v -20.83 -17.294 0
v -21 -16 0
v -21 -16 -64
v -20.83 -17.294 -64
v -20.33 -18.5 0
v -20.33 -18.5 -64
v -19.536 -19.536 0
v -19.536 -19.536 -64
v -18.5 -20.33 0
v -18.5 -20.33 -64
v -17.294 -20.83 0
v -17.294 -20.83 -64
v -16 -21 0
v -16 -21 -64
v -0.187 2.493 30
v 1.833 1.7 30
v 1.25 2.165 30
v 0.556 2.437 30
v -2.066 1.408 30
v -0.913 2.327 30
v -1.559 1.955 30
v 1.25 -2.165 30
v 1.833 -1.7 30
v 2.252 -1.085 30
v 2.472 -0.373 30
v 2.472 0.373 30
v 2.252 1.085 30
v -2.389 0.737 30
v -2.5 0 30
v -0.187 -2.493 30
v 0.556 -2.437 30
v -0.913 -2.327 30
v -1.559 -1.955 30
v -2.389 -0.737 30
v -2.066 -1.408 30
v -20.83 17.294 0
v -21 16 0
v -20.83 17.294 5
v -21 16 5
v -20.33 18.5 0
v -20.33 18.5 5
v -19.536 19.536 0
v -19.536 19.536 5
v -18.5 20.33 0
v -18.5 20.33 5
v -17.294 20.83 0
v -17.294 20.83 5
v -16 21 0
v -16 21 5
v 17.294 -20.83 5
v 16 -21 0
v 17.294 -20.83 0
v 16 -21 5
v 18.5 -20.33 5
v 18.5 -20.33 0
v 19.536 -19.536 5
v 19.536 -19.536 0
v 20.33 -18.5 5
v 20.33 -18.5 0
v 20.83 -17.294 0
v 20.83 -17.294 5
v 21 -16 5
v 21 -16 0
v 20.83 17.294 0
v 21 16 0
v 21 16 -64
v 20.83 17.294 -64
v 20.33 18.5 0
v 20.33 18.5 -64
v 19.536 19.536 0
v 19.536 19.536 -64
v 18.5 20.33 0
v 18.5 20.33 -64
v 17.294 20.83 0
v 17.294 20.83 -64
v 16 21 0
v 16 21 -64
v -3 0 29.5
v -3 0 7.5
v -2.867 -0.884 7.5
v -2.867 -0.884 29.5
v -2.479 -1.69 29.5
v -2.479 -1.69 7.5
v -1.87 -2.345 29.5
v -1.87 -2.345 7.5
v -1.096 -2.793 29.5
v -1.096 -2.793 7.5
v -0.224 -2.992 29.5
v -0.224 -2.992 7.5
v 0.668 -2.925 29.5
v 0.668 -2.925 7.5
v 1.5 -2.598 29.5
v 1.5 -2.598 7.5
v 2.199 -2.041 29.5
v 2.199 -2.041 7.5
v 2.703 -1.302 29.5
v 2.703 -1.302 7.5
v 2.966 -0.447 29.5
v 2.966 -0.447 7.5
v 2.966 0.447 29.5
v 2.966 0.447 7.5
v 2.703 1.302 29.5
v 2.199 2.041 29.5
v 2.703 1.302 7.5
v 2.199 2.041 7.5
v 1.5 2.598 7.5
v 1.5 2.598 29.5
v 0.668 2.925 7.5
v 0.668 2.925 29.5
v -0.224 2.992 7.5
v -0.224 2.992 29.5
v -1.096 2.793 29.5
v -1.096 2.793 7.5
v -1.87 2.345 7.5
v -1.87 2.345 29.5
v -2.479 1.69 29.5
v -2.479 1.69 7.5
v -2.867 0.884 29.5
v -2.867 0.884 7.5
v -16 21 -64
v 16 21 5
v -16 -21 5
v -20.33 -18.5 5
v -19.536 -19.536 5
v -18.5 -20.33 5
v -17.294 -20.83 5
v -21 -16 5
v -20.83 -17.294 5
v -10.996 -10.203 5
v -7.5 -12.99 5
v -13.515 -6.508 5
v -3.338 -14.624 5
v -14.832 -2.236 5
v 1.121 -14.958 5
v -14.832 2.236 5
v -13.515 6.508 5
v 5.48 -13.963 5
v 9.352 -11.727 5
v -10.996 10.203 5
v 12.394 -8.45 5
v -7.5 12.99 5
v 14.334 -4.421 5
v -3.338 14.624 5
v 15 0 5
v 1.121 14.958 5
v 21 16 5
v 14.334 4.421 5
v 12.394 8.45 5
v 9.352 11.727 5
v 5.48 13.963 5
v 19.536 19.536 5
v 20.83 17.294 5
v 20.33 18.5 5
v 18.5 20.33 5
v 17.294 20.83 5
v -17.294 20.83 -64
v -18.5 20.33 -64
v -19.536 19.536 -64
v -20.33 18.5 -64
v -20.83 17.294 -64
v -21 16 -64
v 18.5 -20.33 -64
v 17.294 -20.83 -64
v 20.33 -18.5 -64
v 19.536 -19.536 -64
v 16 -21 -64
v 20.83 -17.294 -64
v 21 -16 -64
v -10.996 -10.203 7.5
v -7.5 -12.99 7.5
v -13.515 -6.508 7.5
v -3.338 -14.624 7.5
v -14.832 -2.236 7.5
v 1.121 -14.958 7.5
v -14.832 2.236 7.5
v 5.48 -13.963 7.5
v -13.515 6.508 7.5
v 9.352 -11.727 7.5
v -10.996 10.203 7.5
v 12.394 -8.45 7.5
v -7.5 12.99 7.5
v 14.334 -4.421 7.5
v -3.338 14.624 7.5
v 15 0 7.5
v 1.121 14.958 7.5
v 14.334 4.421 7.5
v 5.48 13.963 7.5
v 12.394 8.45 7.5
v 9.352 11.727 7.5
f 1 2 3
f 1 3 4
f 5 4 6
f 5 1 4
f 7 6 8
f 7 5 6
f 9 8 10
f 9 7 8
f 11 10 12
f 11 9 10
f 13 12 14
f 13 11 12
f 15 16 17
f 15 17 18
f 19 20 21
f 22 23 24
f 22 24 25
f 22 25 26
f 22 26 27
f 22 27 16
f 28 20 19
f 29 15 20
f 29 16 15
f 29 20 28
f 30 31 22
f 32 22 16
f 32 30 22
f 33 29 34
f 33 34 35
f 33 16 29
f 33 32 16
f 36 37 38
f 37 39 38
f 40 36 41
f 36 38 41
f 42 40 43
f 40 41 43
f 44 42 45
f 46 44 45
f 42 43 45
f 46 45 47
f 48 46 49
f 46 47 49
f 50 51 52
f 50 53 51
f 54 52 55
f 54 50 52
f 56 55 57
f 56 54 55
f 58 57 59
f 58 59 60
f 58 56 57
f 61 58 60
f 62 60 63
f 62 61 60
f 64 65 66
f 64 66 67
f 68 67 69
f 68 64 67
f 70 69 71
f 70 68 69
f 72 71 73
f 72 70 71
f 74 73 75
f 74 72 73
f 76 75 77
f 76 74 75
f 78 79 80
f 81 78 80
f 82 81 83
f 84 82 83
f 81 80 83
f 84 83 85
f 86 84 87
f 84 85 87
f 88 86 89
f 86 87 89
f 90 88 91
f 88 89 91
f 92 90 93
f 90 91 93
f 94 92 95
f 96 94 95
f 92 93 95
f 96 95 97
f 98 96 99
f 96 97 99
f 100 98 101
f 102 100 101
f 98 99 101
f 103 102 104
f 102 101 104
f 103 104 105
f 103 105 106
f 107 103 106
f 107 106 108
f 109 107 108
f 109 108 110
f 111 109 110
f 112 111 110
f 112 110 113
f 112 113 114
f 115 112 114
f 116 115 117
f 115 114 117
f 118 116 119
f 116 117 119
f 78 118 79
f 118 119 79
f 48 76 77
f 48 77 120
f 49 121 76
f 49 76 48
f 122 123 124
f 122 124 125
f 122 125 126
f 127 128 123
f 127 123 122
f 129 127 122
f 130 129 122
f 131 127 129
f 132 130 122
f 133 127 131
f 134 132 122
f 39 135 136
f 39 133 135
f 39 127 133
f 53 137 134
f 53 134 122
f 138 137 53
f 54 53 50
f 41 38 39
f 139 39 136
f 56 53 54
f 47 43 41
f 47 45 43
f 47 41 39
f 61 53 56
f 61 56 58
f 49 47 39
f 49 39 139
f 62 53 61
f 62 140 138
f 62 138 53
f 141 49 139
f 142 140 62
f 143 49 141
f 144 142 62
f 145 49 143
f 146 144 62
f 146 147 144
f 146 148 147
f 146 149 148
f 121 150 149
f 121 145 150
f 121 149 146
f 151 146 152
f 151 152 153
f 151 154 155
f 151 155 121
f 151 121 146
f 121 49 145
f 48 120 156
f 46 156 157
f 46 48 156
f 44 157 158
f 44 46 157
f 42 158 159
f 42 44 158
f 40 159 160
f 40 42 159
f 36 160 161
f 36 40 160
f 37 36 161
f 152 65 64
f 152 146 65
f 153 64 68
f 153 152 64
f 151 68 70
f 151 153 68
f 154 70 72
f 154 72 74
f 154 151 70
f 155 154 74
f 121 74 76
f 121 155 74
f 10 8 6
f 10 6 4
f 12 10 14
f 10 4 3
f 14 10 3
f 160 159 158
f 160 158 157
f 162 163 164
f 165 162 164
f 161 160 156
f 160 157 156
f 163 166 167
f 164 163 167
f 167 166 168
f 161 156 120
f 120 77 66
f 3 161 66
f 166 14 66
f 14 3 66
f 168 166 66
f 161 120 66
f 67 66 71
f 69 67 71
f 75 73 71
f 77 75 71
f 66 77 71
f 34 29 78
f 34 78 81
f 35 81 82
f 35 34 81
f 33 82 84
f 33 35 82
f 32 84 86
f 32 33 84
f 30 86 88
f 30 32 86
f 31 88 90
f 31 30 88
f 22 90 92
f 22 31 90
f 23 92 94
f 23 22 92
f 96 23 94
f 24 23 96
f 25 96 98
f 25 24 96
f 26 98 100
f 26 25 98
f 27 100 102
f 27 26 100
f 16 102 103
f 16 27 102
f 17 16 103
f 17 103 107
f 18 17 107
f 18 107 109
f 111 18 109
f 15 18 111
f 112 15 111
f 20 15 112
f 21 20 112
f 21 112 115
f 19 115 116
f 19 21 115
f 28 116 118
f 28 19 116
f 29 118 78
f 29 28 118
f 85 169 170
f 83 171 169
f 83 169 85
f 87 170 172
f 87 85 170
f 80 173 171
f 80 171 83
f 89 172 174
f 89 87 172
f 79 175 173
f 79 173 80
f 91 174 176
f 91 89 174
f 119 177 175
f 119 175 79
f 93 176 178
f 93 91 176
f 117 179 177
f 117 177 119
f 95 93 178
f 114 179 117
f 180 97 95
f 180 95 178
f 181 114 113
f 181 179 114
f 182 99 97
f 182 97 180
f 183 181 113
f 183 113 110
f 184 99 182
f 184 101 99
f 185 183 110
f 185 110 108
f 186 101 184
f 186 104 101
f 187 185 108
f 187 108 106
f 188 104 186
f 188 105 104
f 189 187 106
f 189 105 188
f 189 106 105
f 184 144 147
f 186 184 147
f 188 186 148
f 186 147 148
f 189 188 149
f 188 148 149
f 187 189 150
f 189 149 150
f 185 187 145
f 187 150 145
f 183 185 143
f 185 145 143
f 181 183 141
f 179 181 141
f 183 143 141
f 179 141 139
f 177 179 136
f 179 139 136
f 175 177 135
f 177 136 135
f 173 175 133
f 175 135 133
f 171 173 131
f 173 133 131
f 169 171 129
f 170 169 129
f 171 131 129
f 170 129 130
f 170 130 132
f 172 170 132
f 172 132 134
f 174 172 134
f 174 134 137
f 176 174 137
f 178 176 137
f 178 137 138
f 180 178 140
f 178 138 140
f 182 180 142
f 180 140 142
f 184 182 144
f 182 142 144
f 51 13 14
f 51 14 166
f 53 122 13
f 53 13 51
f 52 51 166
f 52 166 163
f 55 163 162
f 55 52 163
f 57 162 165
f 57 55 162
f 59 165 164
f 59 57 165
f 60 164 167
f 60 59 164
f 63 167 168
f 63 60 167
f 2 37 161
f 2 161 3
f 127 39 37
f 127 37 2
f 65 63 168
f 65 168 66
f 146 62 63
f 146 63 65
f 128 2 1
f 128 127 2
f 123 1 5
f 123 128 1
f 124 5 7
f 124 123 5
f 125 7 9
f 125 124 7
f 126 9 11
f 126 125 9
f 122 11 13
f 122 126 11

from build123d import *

# Parameters (mm, degrees)
SKETCH1_W           = 42
SKETCH1_H           = 42
BOSS_EXTRUDE1_DEPTH = 5
FILLET1_R           = 5
SKETCH2_R           = 15
BOSS_EXTRUDE2_DEPTH = 2.5
SKETCH3_R           = 3
BOSS_EXTRUDE3_DEPTH = 22.5
BOSS_EXTRUDE5_DEPTH = 64
CHAMFER1_SIZE       = 0.5


with BuildPart() as part:
    # Sketch1 → Boss-Extrude1 (new body)
    with BuildSketch(Plane.XY):
        Rectangle(SKETCH1_W, SKETCH1_H)
    extrude(amount=BOSS_EXTRUDE1_DEPTH)

    # Fillet1
    fillet1_edges = [part.edges().sort_by_distance(p)[0] for p in [
        (21, -21, 2.5),
        (-21, -21, 2.5),
        (-21, 21, 2.5),
        (21, 21, 2.5),
    ]]
    fillet(fillet1_edges, radius=FILLET1_R)

    # Sketch2 → Boss-Extrude2 (add)
    with BuildSketch(Plane.XY.offset(5)):
        Circle(SKETCH2_R)
    extrude(amount=BOSS_EXTRUDE2_DEPTH)

    # Sketch3 → Boss-Extrude3 (add)
    with BuildSketch(Plane.XY.offset(7.5)):
        with Locations(Location((0, 0, 0), (0, 0, 180))):
            Circle(SKETCH3_R)
    extrude(amount=BOSS_EXTRUDE3_DEPTH)

    # Sketch4 → Boss-Extrude5 (add)
    with BuildSketch(Plane(origin=(0, 0, 0), x_dir=(-1, 0, 0), z_dir=(0, 0, -1))):
        with BuildLine():
            Line((-21, -16), (-21, 16))
            ThreePointArc((-21, 16), (-19.535533906, 19.535533906), (-16, 21))
            Line((-16, 21), (16, 21))
            ThreePointArc((16, 21), (19.535533906, 19.535533906), (21, 16))
            Line((21, 16), (21, -16))
            ThreePointArc((21, -16), (19.535533906, -19.535533906), (16, -21))
            Line((16, -21), (-16, -21))
            ThreePointArc((-16, -21), (-19.535533906, -19.535533906), (-21, -16))
        make_face()
    extrude(amount=BOSS_EXTRUDE5_DEPTH)

    # Chamfer1
    chamfer1_edges = [part.edges().sort_by_distance(p)[0] for p in [
        (3, 0, 30),
    ]]
    chamfer(chamfer1_edges, length=CHAMFER1_SIZE)


solid = part.part
